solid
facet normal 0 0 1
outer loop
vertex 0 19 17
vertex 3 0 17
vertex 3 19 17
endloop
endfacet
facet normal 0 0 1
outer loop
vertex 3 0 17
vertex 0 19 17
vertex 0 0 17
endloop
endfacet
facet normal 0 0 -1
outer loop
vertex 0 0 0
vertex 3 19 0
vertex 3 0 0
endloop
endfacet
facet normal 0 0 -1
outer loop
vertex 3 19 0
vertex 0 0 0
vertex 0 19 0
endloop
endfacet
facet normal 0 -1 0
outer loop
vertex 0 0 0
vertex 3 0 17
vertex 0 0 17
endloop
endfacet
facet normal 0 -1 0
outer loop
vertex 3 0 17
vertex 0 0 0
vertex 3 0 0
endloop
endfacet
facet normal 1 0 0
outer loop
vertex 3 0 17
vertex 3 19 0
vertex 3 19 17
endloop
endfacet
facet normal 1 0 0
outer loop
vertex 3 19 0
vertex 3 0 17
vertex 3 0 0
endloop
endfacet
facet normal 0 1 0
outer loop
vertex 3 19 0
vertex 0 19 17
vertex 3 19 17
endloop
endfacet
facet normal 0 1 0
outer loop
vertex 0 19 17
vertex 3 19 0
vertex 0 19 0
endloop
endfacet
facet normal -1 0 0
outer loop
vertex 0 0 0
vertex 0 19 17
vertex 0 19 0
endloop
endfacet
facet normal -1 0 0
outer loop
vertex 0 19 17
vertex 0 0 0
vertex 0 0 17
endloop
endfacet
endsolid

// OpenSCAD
// Generated by SolidPython 1.0.1 on 2020-07-29 00:46:54


cube(size = [3, 19, 17]);
/***********************************************
*********      SolidPython code:      **********
************************************************
 
# import packages: SolidPython
from solid import *
from solid.utils import *
from itertools import chain, combinations, permutations


class Resize:

    def __init__(self, scad_file):
        self.scad_file = scad_file
        #self.scad_file = import_scad(scad_file)
        # cone/cylinder param:
        self.r1 = 0
        self.r2 = 0
        self.h = 0
        # rectangular prism param:
        self.w = 0
        self.l = 0
        # ellipse param:
        self.r = 0

    # import OpenScad code (file name corresponds to shape)


    # classify shape + parameters
    def assign(self, param1, param2, param3):
        if self.scad_file == 'cone.scad':
            self.r1 = param1
            self.r2 = param2
            self.h = param3
        elif self.scad_file == 'cylinder.scad':
            self.r1 = param1
            self.r2 = param2
            self.h = param3
        elif self.scad_file == 'rectangularPrism.scad':
            self.h = param1
            self.l = param2
            self.w = param3
        else:
            self.r = param1
            self.h = param2

    # resize parameters
    def iterate(self):
        x = range(3, 20, 2)
        i = 1
        if self.scad_file == 'cone.scad':
            tempList = list(permutations(x, 2))
            for temp in tempList:
                param1 = temp[0]
                param2 = temp[1]
                filepath = 'produced_scad_files/' + 'cone' + str(param1) + '_' + str(param2) + '_' + '.scad'
                scad_render_to_file(cylinder(h=param1, r1=param2, r2=0), filepath)

        elif self.scad_file == 'cylinder.scad':
            tempList = list(permutations(x, 3))
            for temp in tempList:
                param1 = temp[0]
                param2 = temp[1]
                filepath = 'produced_scad_files/' + 'cylinder' + str(param1) + '_' + str(param2) + '_' + '.scad'
                scad_render_to_file(cylinder(h=param1, r1=param2, r2=param2), filepath)

        elif self.scad_file == 'rectangularPrism.scad':
            tempList = list(permutations(x, 3))
            for temp in tempList:
                param1 = temp[0]
                param2 = temp[1]
                param3 = temp[2]
                filepath = 'produced_scad_files/' + 'rectangularPrism' + str(param1) + '_' + str(param2) + '_' + str(
                    param3) + '.scad'
                scad_render_to_file(cube(size=(param1, param2, param3)), filepath)

        elif self.scad_file == 'ellipse.scad':
            tempList = list(permutations(x, 4))
            for temp in tempList:
                param1 = temp[0]
                param2 = temp[1]
                param3 = temp[2]
                param4 = temp[3]
                filepath = 'produced_scad_files/' + 'ellipse' + str(param1) + '_' + str(param2) + '_' + str(param3) + '_' + str(param4) + '.scad'
                scad_render_to_file(scale([param1, param2, param3])(sphere(r=param4)), filepath)

    def render_to_scadfile(self):
        scad_render_to_file(scad, 'example.scad') 
 
************************************************/
